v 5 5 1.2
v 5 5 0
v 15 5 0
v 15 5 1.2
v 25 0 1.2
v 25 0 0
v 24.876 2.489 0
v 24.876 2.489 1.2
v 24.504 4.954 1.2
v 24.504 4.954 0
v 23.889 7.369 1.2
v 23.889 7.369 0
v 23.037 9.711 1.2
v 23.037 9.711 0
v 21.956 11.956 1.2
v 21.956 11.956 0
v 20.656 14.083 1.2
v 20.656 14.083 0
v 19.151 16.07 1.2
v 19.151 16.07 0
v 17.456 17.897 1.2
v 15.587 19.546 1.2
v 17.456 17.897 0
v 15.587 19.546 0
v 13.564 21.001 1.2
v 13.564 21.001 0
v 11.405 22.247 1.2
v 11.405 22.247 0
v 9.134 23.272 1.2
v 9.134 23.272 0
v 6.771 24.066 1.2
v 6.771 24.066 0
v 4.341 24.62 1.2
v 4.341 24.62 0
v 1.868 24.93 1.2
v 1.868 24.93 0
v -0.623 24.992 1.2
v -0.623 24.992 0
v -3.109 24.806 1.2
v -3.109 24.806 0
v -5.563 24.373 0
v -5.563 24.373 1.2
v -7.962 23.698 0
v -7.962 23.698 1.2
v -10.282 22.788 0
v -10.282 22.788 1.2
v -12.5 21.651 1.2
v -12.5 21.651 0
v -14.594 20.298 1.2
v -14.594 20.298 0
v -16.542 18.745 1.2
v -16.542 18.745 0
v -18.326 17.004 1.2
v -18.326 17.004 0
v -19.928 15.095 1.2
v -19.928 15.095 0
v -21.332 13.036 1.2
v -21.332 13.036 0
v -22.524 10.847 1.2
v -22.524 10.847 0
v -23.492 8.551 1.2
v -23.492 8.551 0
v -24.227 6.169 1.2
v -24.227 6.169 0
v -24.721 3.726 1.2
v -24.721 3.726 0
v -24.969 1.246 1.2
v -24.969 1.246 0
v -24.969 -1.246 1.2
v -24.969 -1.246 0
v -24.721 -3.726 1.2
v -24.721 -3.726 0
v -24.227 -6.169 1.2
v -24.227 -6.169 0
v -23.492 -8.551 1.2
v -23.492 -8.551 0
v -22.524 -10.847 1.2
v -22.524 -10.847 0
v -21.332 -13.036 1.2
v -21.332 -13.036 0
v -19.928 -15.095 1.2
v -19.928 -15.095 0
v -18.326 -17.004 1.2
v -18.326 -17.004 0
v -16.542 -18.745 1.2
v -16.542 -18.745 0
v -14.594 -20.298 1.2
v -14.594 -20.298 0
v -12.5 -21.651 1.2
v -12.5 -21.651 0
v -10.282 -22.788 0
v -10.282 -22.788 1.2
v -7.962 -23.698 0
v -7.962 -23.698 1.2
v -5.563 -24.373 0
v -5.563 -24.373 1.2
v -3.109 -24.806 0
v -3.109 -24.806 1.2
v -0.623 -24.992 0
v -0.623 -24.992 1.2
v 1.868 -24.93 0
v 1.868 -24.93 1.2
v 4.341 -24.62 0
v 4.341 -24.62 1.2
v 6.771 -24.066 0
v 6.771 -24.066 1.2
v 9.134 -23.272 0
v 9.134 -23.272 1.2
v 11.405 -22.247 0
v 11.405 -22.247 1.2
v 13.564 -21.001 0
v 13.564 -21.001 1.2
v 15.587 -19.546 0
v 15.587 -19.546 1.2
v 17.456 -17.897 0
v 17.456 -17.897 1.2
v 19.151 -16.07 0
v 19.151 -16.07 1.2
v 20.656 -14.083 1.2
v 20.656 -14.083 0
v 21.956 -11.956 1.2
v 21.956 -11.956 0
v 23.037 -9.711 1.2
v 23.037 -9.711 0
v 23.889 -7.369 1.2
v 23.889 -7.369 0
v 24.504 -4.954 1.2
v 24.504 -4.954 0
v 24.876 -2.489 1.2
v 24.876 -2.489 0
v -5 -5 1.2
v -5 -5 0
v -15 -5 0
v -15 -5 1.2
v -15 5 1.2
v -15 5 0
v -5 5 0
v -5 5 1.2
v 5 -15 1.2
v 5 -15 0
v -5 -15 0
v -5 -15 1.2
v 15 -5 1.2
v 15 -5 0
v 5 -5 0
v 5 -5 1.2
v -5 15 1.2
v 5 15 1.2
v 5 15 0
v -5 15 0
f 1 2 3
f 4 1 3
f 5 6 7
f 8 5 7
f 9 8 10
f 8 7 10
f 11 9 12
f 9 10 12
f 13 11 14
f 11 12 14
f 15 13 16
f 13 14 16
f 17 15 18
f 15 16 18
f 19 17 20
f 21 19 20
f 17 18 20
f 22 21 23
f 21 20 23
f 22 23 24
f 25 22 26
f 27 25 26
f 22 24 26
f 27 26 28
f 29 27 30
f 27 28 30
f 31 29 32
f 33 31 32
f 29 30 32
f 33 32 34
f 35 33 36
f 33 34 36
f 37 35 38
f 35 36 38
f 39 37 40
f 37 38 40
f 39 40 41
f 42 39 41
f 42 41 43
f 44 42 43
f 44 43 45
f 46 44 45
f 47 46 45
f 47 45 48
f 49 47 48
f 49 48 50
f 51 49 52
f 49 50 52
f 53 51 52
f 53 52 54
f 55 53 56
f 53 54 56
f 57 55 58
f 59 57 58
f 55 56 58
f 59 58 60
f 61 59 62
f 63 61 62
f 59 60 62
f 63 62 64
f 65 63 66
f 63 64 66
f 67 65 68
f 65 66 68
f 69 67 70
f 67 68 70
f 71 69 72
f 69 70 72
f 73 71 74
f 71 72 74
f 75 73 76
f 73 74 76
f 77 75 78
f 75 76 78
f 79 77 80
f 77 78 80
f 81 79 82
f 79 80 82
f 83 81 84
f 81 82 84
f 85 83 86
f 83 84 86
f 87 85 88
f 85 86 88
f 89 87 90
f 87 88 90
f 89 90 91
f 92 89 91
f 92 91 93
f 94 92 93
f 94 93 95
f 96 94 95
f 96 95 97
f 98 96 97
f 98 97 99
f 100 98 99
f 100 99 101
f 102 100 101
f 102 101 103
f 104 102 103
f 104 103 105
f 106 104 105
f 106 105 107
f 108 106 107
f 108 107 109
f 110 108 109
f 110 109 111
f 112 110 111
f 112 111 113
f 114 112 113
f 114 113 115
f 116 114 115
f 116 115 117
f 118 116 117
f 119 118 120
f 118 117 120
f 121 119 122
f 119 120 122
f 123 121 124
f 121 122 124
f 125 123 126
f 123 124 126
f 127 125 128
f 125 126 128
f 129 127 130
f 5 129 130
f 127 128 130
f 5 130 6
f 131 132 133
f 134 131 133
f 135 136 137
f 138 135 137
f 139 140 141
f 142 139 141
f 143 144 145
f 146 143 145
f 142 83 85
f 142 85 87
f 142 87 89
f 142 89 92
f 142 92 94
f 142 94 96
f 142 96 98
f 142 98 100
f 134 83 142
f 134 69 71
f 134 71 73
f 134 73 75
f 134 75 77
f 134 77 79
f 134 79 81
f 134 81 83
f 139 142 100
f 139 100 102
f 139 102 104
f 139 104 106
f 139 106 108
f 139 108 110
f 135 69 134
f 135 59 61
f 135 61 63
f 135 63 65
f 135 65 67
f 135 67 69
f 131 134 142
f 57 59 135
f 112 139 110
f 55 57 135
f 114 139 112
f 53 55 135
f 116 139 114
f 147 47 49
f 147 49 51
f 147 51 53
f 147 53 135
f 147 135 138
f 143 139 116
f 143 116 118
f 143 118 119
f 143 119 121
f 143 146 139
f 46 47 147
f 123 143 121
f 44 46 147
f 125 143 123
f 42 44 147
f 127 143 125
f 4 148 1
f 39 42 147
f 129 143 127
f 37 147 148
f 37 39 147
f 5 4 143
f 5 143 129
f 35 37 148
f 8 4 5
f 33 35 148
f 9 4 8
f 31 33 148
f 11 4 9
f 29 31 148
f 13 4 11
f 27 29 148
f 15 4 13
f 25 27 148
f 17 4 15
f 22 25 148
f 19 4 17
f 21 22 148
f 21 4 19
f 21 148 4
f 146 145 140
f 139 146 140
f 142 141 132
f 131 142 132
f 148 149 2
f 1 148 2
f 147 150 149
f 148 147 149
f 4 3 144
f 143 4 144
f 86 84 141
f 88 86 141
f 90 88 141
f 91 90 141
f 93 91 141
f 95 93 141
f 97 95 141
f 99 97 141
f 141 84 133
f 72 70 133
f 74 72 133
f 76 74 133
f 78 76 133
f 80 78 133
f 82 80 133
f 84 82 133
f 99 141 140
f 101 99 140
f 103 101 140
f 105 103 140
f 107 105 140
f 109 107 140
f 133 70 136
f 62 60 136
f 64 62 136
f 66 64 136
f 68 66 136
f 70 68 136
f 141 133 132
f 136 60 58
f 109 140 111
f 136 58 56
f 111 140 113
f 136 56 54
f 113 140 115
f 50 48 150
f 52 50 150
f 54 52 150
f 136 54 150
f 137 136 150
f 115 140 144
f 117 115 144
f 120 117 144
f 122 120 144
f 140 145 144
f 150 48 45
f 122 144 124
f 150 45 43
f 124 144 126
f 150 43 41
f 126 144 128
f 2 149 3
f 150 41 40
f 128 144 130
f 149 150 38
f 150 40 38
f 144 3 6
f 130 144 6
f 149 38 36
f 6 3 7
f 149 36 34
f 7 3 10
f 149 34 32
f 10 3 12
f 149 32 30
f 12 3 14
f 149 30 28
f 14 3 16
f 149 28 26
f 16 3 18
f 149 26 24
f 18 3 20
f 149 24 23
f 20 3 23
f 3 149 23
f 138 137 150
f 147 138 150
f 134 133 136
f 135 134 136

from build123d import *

# Parameters (mm, degrees)
F0_R     = 25
F1_DEPTH = 1.2


with BuildPart() as f1:
    # F0 (on Top) → F1 (new body)
    with BuildSketch(Plane.XY):
        Circle(F0_R)
        Polygon((5, 15), (5, 5), (15, 5), (15, -5), (5, -5), (5, -15), (-5, -15), (-5, -5), (-15, -5), (-15, 5), (-5, 5), (-5, 15), align=None, mode=Mode.SUBTRACT)
    extrude(amount=F1_DEPTH)


solid = f1.part
